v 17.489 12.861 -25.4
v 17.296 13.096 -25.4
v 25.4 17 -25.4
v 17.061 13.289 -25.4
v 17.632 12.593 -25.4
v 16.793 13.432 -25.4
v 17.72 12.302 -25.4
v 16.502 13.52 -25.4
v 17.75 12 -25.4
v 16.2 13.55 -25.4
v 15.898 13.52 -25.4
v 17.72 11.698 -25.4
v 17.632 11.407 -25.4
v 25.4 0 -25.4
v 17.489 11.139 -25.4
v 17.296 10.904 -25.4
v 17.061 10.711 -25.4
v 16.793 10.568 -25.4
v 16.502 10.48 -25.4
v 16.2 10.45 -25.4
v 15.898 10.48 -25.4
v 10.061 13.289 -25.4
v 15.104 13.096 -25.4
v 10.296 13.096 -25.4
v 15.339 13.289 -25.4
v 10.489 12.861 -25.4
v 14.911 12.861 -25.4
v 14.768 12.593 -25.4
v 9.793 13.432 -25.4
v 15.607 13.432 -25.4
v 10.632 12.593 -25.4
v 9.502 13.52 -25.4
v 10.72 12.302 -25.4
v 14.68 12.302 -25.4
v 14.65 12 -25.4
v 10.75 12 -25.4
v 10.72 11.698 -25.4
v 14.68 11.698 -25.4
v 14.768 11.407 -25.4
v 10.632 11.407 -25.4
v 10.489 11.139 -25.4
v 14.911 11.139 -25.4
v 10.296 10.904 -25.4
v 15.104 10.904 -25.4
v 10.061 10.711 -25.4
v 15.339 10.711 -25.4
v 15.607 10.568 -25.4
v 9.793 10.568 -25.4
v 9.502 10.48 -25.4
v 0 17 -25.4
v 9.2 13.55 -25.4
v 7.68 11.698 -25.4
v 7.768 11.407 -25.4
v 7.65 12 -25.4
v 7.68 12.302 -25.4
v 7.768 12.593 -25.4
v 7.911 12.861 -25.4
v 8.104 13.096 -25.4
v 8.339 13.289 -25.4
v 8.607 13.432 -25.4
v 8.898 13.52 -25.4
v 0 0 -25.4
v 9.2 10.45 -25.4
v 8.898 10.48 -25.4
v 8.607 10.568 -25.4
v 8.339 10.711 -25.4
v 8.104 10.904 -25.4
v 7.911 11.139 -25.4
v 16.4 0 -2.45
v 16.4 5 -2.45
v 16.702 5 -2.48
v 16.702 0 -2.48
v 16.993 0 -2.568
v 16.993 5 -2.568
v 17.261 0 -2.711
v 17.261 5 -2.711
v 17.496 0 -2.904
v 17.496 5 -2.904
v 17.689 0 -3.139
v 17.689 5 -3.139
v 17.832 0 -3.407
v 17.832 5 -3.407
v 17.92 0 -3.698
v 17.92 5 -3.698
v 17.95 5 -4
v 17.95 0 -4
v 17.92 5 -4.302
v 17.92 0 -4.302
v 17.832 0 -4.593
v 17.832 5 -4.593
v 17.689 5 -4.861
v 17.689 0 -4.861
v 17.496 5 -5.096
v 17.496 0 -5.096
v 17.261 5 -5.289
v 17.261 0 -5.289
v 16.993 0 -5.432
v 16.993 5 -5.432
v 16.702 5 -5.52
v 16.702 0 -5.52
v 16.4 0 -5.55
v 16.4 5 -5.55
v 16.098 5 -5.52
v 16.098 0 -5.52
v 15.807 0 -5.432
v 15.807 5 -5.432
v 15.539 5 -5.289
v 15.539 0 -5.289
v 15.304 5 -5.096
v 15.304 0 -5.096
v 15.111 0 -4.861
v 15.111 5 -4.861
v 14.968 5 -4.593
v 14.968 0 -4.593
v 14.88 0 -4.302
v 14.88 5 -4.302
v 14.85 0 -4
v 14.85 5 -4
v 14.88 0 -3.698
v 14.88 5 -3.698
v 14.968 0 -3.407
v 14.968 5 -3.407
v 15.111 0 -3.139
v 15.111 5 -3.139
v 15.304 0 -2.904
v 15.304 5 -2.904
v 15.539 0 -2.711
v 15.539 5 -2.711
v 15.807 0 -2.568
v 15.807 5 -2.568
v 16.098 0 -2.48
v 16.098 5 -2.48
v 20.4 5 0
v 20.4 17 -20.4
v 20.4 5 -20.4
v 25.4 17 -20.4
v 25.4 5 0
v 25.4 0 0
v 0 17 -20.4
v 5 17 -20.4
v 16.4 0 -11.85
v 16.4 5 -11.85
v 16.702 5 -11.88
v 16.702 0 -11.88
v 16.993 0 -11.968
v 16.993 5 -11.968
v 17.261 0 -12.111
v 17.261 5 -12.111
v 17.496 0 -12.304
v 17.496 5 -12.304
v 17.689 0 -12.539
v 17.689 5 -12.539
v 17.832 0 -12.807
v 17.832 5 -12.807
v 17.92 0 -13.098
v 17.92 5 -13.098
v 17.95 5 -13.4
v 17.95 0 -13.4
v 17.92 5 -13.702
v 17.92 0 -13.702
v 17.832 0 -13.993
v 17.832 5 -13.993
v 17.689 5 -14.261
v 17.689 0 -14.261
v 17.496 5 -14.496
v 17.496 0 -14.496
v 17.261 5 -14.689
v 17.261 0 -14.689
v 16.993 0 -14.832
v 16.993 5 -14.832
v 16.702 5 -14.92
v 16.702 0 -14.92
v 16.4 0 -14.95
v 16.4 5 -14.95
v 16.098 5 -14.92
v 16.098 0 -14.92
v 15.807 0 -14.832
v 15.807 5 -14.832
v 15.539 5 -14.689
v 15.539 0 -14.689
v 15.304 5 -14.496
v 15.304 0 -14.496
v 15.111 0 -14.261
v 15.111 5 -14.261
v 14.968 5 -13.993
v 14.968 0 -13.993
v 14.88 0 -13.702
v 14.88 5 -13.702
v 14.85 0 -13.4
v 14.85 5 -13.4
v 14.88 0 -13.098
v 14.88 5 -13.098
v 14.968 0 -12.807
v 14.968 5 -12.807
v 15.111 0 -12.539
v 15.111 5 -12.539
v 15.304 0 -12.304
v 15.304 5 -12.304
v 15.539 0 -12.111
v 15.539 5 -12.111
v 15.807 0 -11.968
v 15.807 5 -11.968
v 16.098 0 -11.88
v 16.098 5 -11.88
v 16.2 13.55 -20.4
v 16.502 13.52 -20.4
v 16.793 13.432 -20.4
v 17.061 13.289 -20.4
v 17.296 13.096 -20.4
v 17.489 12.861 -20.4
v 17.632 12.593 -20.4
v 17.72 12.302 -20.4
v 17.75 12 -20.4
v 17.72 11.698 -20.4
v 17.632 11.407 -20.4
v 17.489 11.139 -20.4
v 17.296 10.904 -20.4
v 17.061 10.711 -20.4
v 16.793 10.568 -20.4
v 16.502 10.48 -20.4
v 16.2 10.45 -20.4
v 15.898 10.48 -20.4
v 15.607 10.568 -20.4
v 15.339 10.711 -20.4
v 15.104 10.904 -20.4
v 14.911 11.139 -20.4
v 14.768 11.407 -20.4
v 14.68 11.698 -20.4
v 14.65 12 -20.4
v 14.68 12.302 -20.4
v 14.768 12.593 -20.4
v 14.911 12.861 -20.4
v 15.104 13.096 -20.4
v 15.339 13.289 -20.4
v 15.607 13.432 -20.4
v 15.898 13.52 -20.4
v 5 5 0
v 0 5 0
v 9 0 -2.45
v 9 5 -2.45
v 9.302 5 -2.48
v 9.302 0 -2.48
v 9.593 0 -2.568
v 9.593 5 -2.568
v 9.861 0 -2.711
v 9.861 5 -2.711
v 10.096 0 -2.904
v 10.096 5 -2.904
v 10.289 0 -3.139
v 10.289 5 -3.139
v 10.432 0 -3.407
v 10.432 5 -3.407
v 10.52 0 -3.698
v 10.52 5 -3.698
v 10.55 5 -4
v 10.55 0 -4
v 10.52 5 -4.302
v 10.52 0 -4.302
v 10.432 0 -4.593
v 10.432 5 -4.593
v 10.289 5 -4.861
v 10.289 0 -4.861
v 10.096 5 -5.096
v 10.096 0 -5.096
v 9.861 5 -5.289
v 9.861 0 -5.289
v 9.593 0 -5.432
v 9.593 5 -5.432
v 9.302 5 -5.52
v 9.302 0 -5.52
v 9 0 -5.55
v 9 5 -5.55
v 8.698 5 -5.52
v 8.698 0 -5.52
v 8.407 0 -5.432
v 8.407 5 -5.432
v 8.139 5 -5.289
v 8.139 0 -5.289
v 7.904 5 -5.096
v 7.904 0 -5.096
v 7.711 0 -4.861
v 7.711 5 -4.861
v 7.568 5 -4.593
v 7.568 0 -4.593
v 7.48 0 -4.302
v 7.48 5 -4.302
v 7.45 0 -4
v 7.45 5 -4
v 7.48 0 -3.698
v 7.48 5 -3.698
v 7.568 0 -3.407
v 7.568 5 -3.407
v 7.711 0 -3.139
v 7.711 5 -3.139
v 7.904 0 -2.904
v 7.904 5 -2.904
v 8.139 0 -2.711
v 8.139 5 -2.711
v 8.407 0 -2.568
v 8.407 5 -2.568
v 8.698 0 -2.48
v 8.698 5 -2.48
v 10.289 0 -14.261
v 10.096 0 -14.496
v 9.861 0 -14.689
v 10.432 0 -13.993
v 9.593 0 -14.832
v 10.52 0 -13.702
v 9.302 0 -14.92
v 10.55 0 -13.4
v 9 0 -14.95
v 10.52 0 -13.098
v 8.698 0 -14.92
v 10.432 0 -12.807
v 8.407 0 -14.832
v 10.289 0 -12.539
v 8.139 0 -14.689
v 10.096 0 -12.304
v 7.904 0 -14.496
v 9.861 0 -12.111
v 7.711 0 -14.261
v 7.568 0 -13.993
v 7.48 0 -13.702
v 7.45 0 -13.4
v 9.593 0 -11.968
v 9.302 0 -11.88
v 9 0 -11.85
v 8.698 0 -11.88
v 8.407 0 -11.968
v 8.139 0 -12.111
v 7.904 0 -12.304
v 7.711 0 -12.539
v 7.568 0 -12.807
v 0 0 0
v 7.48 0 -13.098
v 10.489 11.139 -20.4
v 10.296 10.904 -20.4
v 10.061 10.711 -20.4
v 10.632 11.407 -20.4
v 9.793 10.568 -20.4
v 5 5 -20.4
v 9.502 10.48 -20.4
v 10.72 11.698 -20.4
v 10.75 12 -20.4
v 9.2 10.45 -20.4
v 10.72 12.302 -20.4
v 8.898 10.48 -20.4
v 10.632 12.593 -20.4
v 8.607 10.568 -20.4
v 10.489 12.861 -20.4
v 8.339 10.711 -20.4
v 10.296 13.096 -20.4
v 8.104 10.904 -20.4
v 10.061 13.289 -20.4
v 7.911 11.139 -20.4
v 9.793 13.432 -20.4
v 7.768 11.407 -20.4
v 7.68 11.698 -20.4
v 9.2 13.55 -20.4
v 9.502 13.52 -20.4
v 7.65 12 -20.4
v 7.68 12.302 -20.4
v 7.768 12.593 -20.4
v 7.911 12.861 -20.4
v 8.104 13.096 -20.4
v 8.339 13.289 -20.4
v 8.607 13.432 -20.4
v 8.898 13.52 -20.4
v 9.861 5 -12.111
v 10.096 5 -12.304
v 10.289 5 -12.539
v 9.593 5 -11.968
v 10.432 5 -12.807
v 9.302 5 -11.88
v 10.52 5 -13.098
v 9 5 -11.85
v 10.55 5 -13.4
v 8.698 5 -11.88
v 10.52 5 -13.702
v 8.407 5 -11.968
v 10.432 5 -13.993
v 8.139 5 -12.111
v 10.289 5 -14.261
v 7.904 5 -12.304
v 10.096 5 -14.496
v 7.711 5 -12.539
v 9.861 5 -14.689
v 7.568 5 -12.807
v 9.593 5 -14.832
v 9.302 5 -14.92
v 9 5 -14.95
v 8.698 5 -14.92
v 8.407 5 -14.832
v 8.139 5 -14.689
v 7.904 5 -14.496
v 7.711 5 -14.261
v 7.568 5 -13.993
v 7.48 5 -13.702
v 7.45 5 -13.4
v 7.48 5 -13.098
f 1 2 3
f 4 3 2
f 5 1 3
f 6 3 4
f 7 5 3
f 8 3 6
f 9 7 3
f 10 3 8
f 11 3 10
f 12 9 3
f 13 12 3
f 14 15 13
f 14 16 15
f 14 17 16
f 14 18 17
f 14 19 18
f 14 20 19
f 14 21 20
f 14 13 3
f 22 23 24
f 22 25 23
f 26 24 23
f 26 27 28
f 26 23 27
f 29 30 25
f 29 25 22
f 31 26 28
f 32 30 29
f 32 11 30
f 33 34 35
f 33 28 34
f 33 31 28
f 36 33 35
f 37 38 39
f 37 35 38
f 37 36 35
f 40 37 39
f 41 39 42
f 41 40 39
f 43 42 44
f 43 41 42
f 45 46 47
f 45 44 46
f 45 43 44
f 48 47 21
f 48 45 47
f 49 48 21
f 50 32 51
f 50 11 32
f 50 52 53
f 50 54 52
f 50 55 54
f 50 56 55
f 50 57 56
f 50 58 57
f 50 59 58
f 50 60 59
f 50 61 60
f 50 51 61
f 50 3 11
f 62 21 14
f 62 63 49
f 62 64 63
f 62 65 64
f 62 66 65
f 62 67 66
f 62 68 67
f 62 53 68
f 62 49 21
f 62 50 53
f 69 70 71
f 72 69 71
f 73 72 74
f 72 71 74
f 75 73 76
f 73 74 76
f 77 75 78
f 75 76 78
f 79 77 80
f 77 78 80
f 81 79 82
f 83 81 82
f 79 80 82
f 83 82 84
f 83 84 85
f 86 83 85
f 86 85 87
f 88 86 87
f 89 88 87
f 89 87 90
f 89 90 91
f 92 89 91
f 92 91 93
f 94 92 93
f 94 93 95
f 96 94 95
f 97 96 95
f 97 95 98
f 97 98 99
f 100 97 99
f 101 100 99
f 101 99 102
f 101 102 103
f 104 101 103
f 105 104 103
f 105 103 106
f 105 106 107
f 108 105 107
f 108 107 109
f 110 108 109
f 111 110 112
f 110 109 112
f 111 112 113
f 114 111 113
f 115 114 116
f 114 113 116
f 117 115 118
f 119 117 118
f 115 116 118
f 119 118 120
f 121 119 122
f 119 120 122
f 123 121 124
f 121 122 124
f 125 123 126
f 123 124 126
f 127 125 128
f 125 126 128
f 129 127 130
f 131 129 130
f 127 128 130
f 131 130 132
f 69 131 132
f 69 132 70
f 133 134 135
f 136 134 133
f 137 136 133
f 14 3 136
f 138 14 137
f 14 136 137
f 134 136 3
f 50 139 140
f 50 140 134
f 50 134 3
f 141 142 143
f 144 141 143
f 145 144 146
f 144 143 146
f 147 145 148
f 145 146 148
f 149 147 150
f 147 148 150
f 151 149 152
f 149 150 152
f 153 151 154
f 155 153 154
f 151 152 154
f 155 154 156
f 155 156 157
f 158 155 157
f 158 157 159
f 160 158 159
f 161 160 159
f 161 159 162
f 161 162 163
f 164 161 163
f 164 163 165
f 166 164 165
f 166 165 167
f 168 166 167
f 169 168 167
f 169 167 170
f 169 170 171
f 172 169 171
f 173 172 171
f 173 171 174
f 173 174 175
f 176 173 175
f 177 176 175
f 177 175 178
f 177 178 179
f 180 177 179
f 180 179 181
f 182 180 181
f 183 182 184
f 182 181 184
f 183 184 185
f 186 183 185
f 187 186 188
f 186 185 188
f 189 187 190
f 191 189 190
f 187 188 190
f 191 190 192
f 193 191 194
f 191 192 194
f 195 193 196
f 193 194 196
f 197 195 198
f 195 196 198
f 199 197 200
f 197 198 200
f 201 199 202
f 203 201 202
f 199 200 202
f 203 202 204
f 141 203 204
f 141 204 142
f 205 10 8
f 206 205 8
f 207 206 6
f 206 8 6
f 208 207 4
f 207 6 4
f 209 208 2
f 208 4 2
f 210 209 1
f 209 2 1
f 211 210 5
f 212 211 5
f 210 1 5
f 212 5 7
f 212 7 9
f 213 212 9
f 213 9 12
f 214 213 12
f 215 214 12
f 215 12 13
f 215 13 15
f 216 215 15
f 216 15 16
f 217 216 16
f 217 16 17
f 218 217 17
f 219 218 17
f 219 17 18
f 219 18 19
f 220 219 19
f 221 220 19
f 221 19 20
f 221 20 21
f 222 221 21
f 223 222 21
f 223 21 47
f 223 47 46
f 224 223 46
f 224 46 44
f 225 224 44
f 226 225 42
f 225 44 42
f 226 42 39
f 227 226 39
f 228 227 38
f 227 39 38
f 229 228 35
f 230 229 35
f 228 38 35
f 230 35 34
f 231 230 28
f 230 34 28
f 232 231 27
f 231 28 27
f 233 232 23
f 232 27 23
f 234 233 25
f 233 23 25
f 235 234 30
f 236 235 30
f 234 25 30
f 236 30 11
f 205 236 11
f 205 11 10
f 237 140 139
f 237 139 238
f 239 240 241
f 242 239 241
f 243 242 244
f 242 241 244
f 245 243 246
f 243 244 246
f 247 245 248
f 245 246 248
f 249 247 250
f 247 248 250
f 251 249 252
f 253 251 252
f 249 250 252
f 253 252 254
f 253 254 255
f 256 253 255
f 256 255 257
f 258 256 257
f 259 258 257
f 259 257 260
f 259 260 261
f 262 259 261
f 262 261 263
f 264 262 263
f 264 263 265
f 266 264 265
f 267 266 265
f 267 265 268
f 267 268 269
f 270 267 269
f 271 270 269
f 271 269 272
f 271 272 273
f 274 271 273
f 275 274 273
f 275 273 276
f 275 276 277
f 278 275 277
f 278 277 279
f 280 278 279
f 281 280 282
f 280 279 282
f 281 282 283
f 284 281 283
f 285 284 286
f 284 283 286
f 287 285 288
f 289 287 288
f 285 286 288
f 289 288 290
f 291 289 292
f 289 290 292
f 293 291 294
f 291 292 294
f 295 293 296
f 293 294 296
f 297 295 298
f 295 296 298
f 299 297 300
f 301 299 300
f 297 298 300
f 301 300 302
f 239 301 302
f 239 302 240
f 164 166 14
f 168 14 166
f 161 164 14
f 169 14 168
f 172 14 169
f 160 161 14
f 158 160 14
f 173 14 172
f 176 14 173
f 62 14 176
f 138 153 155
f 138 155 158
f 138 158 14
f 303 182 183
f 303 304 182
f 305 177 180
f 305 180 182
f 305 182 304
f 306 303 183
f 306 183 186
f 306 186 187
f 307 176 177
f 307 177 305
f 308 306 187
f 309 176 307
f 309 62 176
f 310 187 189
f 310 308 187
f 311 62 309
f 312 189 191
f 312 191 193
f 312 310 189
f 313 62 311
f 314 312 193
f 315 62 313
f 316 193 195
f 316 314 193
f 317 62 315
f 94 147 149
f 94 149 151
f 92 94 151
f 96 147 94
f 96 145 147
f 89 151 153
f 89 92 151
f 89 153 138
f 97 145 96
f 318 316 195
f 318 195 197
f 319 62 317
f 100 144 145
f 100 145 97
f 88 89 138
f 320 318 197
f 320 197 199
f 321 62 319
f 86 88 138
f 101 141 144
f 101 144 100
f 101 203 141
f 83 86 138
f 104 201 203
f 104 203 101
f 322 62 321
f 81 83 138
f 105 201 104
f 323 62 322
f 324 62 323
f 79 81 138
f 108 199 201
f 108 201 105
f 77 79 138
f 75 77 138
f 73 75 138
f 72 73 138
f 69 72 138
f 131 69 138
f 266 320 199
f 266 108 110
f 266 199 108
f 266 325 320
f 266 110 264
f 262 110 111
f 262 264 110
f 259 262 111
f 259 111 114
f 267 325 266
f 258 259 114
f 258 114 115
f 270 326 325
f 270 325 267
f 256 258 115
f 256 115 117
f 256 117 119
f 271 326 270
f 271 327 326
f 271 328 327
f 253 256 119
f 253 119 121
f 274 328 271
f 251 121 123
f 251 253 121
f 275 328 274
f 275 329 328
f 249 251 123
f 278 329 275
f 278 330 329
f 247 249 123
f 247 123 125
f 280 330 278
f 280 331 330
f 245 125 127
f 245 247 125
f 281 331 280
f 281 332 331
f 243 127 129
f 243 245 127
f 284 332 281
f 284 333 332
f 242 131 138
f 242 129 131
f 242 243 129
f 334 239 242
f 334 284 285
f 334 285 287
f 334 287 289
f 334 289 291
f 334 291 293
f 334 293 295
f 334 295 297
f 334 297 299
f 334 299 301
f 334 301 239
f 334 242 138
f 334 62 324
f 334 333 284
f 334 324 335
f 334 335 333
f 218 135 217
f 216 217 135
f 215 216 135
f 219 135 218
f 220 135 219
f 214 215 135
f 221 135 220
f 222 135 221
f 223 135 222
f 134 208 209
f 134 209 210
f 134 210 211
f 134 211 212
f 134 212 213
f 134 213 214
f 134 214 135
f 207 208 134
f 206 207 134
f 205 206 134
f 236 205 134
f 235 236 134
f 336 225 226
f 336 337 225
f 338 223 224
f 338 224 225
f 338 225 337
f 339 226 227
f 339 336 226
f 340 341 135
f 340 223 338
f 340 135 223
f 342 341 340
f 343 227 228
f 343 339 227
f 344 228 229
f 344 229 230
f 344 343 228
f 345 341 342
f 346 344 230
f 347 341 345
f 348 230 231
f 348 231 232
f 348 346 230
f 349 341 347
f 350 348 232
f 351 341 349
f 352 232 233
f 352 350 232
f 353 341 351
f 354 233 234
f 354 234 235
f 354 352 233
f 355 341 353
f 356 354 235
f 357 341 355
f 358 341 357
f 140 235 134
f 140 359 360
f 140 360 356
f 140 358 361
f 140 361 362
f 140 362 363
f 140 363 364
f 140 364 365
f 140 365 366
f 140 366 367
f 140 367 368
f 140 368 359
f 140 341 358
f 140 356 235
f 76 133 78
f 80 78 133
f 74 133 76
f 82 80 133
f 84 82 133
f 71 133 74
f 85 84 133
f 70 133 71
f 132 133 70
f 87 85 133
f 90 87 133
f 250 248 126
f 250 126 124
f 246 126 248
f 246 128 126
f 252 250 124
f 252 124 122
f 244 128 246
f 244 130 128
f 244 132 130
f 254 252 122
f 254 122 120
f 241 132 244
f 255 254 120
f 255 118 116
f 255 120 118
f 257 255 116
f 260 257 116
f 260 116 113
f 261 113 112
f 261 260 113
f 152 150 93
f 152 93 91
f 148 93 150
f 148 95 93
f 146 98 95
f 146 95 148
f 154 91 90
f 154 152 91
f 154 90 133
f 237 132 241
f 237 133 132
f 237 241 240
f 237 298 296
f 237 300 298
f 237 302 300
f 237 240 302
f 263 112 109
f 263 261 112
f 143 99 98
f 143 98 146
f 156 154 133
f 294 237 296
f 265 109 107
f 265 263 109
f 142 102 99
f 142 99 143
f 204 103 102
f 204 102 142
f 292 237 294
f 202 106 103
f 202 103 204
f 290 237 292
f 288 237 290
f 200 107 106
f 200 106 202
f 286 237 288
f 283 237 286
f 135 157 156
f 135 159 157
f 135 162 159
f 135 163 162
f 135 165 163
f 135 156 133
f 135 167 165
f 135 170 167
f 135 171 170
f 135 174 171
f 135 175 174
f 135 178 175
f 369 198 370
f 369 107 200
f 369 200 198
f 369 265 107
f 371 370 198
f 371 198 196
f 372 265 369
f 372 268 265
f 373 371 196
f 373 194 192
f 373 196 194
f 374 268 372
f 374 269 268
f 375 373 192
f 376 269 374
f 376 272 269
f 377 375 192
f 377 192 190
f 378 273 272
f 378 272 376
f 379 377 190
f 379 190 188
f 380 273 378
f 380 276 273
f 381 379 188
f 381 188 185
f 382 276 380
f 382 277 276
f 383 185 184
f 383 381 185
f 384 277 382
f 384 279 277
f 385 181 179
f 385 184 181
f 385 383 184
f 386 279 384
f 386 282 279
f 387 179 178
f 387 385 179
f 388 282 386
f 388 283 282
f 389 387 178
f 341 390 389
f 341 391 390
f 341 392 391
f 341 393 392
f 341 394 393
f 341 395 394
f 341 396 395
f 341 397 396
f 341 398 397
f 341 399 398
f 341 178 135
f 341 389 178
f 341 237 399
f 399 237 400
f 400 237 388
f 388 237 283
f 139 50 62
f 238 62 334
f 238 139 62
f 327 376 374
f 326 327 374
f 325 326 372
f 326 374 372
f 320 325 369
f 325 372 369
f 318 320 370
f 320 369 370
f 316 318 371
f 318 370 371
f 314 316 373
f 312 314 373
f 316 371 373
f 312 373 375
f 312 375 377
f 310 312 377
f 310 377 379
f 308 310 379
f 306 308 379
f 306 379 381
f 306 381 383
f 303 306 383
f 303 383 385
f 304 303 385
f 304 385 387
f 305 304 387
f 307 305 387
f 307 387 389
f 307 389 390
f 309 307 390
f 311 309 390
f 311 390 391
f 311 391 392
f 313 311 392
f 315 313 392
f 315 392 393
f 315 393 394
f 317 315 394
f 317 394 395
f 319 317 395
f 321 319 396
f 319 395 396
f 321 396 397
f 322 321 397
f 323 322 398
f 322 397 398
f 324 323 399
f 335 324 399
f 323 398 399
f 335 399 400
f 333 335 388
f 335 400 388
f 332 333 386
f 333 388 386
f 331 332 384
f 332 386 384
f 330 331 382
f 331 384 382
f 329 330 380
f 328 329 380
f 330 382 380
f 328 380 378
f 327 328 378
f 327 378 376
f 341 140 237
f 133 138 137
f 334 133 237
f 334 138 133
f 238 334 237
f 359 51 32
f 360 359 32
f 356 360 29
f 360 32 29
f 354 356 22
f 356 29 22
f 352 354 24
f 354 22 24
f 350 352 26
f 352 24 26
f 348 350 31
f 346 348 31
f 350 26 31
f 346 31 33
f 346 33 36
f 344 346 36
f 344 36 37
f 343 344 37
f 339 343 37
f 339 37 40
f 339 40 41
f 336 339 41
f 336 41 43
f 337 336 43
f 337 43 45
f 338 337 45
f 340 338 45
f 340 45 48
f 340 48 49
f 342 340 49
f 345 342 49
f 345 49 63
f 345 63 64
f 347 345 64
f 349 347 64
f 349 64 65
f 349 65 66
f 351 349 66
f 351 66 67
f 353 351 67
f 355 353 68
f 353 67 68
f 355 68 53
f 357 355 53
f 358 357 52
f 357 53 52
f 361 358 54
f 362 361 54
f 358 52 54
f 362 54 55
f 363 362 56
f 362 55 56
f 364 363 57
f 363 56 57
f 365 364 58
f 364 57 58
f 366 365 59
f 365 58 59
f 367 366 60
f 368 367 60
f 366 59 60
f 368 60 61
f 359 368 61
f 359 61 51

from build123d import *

# Parameters (mm, degrees)
BOSS_EXTRUDE2_DEPTH = 25.4
CUT_EXTRUDE1_REACH  = 41.741
SKETCH4_R           = 1.55
RIB12_REACH         = 41.741
SKETCH8_WALL_W      = 105.149018068
SKETCH8_WALL_H      = 5
CUT_EXTRUDE2_REACH  = 39.872
SKETCH5_R           = 1.55


with BuildPart() as part:
    # Sketch3 → Boss-Extrude2 (new body)
    with BuildSketch(Plane(origin=(0, 0, 0), x_dir=(0, 0, -1), z_dir=(1, 0, 0))):
        Polygon((0, 0), (0, 5), (20.4, 5), (20.4, 17), (25.4, 17), (25.4, 0), align=None)
    extrude(amount=BOSS_EXTRUDE2_DEPTH)

    # Sketch4 → Cut-Extrude1 (cut, up to next)
    with BuildSketch(Plane(origin=(0, 0, -25.4), x_dir=(-1, 0, 0), z_dir=(0, 0, -1)), mode=Mode.PRIVATE) as cut_extrude1_sk1:
        with Locations(Location((-16.2, 12, 0), (0, 0, 90))):
            Circle(SKETCH4_R)
    cut_extrude1_tool1 = extrude(cut_extrude1_sk1.sketch, amount=-CUT_EXTRUDE1_REACH, mode=Mode.PRIVATE) & part.part
    # Sketch4 → Cut-Extrude1 (cut, up to next)
    with BuildSketch(Plane(origin=(0, 0, -25.4), x_dir=(-1, 0, 0), z_dir=(0, 0, -1)), mode=Mode.PRIVATE) as cut_extrude1_sk2:
        with Locations(Location((-9.2, 12, 0), (0, 0, 90))):
            Circle(SKETCH4_R)
    cut_extrude1_tool2 = extrude(cut_extrude1_sk2.sketch, amount=-CUT_EXTRUDE1_REACH, mode=Mode.PRIVATE) & part.part
    add(cut_extrude1_tool1.solids().sort_by_distance((16.2, 12, -25.4))[0], mode=Mode.SUBTRACT)
    add(cut_extrude1_tool2.solids().sort_by_distance((9.2, 12, -25.4))[0], mode=Mode.SUBTRACT)

    # Sketch8 wall → Rib12 (add, up to next)
    with BuildSketch(Plane(origin=(0, 11, -10.2), x_dir=(0, -0.507020126563, 0.861934215158), z_dir=(0, 0.861934215158, 0.507020126563)), mode=Mode.PRIVATE) as rib12_sk1:
        with Locations((0, 2.5)):
            Rectangle(SKETCH8_WALL_W, SKETCH8_WALL_H)
    rib12_tool1 = extrude(rib12_sk1.sketch, amount=-RIB12_REACH, mode=Mode.PRIVATE) - part.part
    rib12 = rib12_tool1.solids().sort_by_distance((0, 11, -10.2))[0]
    add(rib12)

    # Mirror1: Rib12 across plane
    add(rib12.mirror(Plane(origin=(12.7, 0, 0), x_dir=(0, 0, 1), z_dir=(1, 0, 0))))

    # Sketch5 → Cut-Extrude2 (cut, up to next)
    with BuildSketch(Plane(origin=(0, 5, 0), x_dir=(1, 0, 0), z_dir=(0, 1, 0)), mode=Mode.PRIVATE) as cut_extrude2_sk1:
        with Locations(Location((9, 4, 0), (0, 0, 270))):
            Circle(SKETCH5_R)
    cut_extrude2_tool1 = extrude(cut_extrude2_sk1.sketch, amount=-CUT_EXTRUDE2_REACH, mode=Mode.PRIVATE) & part.part
    # Sketch5 → Cut-Extrude2 (cut, up to next)
    with BuildSketch(Plane(origin=(0, 5, 0), x_dir=(1, 0, 0), z_dir=(0, 1, 0)), mode=Mode.PRIVATE) as cut_extrude2_sk2:
        with Locations(Location((9, 13.4, 0), (0, 0, 270))):
            Circle(SKETCH5_R)
    cut_extrude2_tool2 = extrude(cut_extrude2_sk2.sketch, amount=-CUT_EXTRUDE2_REACH, mode=Mode.PRIVATE) & part.part
    # Sketch5 → Cut-Extrude2 (cut, up to next)
    with BuildSketch(Plane(origin=(0, 5, 0), x_dir=(1, 0, 0), z_dir=(0, 1, 0)), mode=Mode.PRIVATE) as cut_extrude2_sk3:
        with Locations(Location((16.4, 13.4, 0), (0, 0, 270))):
            Circle(SKETCH5_R)
    cut_extrude2_tool3 = extrude(cut_extrude2_sk3.sketch, amount=-CUT_EXTRUDE2_REACH, mode=Mode.PRIVATE) & part.part
    # Sketch5 → Cut-Extrude2 (cut, up to next)
    with BuildSketch(Plane(origin=(0, 5, 0), x_dir=(1, 0, 0), z_dir=(0, 1, 0)), mode=Mode.PRIVATE) as cut_extrude2_sk4:
        with Locations(Location((16.4, 4, 0), (0, 0, 270))):
            Circle(SKETCH5_R)
    cut_extrude2_tool4 = extrude(cut_extrude2_sk4.sketch, amount=-CUT_EXTRUDE2_REACH, mode=Mode.PRIVATE) & part.part
    add(cut_extrude2_tool1.solids().sort_by_distance((9, 5, -4))[0], mode=Mode.SUBTRACT)
    add(cut_extrude2_tool2.solids().sort_by_distance((9, 5, -13.4))[0], mode=Mode.SUBTRACT)
    add(cut_extrude2_tool3.solids().sort_by_distance((16.4, 5, -13.4))[0], mode=Mode.SUBTRACT)
    add(cut_extrude2_tool4.solids().sort_by_distance((16.4, 5, -4))[0], mode=Mode.SUBTRACT)


solid = part.part
